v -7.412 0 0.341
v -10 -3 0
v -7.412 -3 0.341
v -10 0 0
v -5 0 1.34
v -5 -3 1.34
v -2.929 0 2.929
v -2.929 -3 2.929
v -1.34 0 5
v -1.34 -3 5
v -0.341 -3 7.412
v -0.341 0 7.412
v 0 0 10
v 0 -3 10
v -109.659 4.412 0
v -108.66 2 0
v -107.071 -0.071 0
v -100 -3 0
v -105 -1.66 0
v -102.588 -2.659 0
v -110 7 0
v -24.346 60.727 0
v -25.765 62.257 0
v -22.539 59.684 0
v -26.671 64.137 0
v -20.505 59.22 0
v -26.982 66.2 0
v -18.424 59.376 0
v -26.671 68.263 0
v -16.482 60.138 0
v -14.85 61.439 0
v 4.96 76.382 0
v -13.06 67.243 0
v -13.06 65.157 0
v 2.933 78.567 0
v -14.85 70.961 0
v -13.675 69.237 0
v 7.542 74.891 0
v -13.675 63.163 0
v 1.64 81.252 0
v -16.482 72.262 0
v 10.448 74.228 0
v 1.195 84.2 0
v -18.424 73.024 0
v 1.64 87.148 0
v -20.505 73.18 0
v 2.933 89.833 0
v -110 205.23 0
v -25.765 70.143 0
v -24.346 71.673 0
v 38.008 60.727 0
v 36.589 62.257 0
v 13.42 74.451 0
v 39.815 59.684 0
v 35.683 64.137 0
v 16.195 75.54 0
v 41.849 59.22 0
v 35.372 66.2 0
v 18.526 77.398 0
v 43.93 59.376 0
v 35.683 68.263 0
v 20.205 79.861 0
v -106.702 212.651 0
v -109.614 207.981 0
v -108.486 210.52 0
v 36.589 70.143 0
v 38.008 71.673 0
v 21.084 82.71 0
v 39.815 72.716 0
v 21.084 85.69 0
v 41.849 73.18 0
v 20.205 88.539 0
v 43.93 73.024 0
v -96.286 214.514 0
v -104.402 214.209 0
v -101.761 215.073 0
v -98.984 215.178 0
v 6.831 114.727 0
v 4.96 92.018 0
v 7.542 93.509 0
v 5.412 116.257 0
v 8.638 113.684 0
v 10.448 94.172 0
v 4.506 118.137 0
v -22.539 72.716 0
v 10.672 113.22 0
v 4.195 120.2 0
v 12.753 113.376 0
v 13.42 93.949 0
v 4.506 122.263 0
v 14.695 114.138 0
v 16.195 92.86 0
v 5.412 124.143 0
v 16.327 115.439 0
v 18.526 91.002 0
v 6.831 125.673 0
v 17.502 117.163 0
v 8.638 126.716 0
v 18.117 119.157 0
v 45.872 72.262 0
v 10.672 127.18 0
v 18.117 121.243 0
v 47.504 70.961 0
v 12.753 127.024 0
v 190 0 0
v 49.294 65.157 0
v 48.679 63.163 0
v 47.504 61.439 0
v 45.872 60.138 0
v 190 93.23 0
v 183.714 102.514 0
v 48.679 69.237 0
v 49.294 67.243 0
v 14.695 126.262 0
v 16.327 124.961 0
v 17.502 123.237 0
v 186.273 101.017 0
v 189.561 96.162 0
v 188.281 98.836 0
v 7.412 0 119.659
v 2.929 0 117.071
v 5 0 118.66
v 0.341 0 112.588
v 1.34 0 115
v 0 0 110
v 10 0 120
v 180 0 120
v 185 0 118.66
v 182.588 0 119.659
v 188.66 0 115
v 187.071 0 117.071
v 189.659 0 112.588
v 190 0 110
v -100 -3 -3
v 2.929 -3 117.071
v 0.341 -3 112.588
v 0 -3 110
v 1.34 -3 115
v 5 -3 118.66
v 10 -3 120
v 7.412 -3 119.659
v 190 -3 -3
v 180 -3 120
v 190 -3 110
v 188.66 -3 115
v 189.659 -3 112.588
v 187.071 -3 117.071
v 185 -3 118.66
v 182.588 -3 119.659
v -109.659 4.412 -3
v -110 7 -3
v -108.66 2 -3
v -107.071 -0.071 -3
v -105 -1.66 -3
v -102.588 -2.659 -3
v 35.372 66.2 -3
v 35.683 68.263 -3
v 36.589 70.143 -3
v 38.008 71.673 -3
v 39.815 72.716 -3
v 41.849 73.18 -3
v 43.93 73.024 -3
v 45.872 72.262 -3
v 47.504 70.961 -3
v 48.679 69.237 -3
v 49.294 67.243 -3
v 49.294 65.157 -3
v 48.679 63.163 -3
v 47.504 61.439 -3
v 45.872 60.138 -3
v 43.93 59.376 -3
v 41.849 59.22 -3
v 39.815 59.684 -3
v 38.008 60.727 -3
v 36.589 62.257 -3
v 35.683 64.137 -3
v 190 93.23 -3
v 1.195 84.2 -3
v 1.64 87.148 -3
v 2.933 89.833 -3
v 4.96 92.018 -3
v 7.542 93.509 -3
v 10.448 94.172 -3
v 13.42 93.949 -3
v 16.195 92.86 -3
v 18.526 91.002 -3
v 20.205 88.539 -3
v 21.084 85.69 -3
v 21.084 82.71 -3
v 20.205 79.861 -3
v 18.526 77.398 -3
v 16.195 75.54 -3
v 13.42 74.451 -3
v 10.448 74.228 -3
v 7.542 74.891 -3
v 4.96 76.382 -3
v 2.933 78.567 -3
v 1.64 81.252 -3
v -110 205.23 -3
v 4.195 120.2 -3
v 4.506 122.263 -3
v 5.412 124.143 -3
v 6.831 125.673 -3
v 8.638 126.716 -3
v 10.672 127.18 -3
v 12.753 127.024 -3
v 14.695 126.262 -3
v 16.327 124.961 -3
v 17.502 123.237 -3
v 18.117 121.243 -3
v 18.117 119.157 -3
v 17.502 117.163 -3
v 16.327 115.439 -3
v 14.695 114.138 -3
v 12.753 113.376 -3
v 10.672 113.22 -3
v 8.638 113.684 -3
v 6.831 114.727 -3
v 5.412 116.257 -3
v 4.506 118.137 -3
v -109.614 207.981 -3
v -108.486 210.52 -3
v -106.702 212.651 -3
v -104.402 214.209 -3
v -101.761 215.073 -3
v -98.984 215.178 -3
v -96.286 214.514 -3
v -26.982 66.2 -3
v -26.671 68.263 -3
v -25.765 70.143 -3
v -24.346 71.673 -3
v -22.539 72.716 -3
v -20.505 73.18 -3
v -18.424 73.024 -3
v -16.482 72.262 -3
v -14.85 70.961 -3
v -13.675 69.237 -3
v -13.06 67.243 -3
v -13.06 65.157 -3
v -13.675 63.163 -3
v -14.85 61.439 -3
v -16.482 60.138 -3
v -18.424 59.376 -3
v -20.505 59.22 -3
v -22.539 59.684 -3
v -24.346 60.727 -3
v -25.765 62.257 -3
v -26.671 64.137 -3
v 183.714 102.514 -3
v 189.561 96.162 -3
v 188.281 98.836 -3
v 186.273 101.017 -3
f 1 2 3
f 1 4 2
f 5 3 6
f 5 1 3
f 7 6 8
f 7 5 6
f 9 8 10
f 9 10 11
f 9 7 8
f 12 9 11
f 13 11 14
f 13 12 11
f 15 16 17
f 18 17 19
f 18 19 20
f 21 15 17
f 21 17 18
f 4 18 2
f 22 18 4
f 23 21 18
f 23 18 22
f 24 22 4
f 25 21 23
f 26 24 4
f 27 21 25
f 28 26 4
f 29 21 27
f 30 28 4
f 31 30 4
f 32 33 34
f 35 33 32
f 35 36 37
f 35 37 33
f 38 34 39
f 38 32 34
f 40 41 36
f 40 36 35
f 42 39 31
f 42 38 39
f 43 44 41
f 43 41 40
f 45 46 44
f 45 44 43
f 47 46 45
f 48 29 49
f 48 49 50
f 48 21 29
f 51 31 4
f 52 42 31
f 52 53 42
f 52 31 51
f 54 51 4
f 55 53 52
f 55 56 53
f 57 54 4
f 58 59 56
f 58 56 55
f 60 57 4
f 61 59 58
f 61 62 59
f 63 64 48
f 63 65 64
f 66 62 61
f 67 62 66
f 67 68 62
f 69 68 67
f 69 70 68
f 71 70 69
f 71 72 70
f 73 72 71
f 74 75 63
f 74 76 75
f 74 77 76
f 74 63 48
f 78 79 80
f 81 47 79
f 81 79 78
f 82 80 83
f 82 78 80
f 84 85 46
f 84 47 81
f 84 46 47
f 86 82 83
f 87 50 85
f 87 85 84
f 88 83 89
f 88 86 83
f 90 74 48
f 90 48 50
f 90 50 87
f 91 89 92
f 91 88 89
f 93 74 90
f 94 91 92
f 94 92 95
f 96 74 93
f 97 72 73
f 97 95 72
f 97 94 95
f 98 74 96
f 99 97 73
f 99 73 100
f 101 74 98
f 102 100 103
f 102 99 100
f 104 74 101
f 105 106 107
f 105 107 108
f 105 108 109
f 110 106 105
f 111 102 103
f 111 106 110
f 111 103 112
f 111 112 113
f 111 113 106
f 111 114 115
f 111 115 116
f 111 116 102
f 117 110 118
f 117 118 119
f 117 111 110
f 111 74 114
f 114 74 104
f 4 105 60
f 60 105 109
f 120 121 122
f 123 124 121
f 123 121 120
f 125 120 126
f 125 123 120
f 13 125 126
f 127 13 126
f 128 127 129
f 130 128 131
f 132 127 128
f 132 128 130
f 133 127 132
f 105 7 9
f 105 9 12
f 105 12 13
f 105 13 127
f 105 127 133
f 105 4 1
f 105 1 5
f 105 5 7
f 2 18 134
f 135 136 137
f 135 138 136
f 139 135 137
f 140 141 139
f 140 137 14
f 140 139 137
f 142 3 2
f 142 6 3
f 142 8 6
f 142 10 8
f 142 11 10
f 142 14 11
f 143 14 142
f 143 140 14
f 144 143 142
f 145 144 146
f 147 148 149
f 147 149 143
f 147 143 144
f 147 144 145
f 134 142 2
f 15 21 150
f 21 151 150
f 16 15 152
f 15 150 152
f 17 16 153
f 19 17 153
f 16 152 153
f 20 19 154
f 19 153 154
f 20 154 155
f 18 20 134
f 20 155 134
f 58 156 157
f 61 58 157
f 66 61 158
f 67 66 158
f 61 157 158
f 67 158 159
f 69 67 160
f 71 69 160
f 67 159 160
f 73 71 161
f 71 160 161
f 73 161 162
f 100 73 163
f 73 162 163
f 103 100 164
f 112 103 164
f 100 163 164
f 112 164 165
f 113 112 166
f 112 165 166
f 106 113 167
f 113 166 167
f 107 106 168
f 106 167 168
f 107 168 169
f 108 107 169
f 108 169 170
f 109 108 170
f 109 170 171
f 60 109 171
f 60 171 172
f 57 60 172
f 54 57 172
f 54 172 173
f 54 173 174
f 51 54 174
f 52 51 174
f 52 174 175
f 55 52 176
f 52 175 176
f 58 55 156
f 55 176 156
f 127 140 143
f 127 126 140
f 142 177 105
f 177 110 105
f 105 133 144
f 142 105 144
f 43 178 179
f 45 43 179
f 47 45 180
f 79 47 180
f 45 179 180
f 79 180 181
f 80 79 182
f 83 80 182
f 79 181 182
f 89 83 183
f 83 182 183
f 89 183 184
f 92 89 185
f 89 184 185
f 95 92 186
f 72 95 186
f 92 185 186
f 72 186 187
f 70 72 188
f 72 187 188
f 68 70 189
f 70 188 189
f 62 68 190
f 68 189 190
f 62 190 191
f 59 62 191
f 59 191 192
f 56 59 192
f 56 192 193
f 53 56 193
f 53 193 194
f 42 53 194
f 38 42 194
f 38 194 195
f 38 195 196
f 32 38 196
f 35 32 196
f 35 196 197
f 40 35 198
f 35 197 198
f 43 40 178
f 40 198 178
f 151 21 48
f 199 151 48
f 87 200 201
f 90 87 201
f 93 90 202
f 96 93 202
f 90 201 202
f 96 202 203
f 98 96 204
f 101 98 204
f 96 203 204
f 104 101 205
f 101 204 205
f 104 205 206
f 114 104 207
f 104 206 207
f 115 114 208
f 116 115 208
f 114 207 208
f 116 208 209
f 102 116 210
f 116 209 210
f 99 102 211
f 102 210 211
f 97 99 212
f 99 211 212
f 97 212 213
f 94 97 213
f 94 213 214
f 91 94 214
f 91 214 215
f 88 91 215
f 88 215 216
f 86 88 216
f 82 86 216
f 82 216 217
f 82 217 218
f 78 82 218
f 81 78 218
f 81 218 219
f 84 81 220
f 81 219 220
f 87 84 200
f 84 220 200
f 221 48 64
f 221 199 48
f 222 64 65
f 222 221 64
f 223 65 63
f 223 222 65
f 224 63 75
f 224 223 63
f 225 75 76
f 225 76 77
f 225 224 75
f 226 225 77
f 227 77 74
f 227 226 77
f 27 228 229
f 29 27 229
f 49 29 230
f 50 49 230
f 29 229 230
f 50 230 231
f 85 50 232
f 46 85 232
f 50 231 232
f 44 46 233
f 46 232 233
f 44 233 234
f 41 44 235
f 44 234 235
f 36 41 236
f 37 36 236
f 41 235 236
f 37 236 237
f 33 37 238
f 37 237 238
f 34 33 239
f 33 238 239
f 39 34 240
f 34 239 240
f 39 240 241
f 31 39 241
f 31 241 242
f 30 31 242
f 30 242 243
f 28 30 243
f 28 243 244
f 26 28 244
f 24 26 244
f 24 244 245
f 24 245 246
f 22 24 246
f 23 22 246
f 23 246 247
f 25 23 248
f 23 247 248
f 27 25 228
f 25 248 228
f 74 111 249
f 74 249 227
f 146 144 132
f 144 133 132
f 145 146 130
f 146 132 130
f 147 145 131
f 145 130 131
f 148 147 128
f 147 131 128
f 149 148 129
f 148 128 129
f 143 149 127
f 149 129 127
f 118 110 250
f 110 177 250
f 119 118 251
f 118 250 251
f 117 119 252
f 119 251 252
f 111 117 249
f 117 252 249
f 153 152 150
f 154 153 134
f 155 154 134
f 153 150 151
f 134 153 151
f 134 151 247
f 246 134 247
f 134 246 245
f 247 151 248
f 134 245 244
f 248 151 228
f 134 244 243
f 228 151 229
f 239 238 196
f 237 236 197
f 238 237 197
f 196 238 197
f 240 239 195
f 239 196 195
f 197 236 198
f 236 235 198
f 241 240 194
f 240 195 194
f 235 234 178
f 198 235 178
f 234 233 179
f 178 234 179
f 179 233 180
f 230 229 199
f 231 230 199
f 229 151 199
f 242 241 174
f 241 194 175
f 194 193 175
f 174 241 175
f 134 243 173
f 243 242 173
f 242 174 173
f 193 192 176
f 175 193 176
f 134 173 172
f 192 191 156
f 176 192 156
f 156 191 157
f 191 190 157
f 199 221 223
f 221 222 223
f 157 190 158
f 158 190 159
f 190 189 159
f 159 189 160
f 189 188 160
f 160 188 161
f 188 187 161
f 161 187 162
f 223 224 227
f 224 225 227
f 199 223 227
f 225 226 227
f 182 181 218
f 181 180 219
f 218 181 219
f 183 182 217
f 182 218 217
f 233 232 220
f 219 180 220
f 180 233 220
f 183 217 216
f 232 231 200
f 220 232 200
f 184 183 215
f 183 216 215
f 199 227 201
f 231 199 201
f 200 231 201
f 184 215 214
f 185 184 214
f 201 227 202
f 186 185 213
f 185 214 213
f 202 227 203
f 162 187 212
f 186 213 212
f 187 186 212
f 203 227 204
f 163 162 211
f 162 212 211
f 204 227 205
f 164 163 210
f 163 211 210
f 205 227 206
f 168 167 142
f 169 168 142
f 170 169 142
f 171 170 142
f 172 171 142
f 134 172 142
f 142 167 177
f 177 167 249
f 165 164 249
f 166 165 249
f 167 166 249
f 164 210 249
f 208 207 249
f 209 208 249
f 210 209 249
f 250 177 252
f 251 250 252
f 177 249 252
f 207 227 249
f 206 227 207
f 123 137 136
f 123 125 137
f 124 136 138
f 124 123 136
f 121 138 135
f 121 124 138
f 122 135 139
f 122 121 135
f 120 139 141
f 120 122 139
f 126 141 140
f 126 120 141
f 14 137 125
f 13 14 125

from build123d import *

# Parameters (mm, degrees)
SKETCH1_W           = 190
SKETCH1_H           = 3
EXTRUDE_THIN1_DEPTH = 120
BOSS_EXTRUDE1_DEPTH = 3
FILLET2_R           = 10
SKETCH4_R           = 7
SKETCH4_R_2         = 10
CUT_EXTRUDE1_DEPTH  = 3


with BuildPart() as part:
    # Sketch1 → Extrude-Thin1 (new body)
    with BuildSketch(Plane.XY):
        with Locations((95, -1.5)):
            Rectangle(SKETCH1_W, SKETCH1_H)
    extrude(amount=EXTRUDE_THIN1_DEPTH)

    # Sketch3 → Boss-Extrude1 (add)
    with BuildSketch(Plane(origin=(0, 0, 0), x_dir=(-1, 0, 0), z_dir=(0, 0, -1))):
        Polygon((-190, 0), (-190, 100), (110, 220), (110, 0), (110, -3), (-190, -3), align=None)
    extrude(amount=BOSS_EXTRUDE1_DEPTH)

    # Fillet2
    fillet2_edges = [part.edges().sort_by_distance(p)[0] for p in [
        (0, -1.5, 120),
        (-110, -3, -1.5),
        (-110, 220, -1.5),
        (190, 100, -1.5),
        (0, -1.5, 0),
        (190, -1.5, 120),
    ]]
    fillet(fillet2_edges, radius=FILLET2_R)

    # Sketch4 → Cut-Extrude1 (cut)
    with BuildSketch(Plane(origin=(0, 0, -3), x_dir=(-1, 0, 0), z_dir=(0, 0, -1))):
        with Locations((-42.372187551, 66.2)):
            Circle(SKETCH4_R)
        with Locations((19.981641522, 66.2)):
            Circle(SKETCH4_R)
        with Locations((-11.195273015, 120.2)):
            Circle(SKETCH4_R)
        with Locations((-11.195273015, 84.2)):
            Circle(SKETCH4_R_2)
    extrude(amount=-CUT_EXTRUDE1_DEPTH, mode=Mode.SUBTRACT)


solid = part.part
